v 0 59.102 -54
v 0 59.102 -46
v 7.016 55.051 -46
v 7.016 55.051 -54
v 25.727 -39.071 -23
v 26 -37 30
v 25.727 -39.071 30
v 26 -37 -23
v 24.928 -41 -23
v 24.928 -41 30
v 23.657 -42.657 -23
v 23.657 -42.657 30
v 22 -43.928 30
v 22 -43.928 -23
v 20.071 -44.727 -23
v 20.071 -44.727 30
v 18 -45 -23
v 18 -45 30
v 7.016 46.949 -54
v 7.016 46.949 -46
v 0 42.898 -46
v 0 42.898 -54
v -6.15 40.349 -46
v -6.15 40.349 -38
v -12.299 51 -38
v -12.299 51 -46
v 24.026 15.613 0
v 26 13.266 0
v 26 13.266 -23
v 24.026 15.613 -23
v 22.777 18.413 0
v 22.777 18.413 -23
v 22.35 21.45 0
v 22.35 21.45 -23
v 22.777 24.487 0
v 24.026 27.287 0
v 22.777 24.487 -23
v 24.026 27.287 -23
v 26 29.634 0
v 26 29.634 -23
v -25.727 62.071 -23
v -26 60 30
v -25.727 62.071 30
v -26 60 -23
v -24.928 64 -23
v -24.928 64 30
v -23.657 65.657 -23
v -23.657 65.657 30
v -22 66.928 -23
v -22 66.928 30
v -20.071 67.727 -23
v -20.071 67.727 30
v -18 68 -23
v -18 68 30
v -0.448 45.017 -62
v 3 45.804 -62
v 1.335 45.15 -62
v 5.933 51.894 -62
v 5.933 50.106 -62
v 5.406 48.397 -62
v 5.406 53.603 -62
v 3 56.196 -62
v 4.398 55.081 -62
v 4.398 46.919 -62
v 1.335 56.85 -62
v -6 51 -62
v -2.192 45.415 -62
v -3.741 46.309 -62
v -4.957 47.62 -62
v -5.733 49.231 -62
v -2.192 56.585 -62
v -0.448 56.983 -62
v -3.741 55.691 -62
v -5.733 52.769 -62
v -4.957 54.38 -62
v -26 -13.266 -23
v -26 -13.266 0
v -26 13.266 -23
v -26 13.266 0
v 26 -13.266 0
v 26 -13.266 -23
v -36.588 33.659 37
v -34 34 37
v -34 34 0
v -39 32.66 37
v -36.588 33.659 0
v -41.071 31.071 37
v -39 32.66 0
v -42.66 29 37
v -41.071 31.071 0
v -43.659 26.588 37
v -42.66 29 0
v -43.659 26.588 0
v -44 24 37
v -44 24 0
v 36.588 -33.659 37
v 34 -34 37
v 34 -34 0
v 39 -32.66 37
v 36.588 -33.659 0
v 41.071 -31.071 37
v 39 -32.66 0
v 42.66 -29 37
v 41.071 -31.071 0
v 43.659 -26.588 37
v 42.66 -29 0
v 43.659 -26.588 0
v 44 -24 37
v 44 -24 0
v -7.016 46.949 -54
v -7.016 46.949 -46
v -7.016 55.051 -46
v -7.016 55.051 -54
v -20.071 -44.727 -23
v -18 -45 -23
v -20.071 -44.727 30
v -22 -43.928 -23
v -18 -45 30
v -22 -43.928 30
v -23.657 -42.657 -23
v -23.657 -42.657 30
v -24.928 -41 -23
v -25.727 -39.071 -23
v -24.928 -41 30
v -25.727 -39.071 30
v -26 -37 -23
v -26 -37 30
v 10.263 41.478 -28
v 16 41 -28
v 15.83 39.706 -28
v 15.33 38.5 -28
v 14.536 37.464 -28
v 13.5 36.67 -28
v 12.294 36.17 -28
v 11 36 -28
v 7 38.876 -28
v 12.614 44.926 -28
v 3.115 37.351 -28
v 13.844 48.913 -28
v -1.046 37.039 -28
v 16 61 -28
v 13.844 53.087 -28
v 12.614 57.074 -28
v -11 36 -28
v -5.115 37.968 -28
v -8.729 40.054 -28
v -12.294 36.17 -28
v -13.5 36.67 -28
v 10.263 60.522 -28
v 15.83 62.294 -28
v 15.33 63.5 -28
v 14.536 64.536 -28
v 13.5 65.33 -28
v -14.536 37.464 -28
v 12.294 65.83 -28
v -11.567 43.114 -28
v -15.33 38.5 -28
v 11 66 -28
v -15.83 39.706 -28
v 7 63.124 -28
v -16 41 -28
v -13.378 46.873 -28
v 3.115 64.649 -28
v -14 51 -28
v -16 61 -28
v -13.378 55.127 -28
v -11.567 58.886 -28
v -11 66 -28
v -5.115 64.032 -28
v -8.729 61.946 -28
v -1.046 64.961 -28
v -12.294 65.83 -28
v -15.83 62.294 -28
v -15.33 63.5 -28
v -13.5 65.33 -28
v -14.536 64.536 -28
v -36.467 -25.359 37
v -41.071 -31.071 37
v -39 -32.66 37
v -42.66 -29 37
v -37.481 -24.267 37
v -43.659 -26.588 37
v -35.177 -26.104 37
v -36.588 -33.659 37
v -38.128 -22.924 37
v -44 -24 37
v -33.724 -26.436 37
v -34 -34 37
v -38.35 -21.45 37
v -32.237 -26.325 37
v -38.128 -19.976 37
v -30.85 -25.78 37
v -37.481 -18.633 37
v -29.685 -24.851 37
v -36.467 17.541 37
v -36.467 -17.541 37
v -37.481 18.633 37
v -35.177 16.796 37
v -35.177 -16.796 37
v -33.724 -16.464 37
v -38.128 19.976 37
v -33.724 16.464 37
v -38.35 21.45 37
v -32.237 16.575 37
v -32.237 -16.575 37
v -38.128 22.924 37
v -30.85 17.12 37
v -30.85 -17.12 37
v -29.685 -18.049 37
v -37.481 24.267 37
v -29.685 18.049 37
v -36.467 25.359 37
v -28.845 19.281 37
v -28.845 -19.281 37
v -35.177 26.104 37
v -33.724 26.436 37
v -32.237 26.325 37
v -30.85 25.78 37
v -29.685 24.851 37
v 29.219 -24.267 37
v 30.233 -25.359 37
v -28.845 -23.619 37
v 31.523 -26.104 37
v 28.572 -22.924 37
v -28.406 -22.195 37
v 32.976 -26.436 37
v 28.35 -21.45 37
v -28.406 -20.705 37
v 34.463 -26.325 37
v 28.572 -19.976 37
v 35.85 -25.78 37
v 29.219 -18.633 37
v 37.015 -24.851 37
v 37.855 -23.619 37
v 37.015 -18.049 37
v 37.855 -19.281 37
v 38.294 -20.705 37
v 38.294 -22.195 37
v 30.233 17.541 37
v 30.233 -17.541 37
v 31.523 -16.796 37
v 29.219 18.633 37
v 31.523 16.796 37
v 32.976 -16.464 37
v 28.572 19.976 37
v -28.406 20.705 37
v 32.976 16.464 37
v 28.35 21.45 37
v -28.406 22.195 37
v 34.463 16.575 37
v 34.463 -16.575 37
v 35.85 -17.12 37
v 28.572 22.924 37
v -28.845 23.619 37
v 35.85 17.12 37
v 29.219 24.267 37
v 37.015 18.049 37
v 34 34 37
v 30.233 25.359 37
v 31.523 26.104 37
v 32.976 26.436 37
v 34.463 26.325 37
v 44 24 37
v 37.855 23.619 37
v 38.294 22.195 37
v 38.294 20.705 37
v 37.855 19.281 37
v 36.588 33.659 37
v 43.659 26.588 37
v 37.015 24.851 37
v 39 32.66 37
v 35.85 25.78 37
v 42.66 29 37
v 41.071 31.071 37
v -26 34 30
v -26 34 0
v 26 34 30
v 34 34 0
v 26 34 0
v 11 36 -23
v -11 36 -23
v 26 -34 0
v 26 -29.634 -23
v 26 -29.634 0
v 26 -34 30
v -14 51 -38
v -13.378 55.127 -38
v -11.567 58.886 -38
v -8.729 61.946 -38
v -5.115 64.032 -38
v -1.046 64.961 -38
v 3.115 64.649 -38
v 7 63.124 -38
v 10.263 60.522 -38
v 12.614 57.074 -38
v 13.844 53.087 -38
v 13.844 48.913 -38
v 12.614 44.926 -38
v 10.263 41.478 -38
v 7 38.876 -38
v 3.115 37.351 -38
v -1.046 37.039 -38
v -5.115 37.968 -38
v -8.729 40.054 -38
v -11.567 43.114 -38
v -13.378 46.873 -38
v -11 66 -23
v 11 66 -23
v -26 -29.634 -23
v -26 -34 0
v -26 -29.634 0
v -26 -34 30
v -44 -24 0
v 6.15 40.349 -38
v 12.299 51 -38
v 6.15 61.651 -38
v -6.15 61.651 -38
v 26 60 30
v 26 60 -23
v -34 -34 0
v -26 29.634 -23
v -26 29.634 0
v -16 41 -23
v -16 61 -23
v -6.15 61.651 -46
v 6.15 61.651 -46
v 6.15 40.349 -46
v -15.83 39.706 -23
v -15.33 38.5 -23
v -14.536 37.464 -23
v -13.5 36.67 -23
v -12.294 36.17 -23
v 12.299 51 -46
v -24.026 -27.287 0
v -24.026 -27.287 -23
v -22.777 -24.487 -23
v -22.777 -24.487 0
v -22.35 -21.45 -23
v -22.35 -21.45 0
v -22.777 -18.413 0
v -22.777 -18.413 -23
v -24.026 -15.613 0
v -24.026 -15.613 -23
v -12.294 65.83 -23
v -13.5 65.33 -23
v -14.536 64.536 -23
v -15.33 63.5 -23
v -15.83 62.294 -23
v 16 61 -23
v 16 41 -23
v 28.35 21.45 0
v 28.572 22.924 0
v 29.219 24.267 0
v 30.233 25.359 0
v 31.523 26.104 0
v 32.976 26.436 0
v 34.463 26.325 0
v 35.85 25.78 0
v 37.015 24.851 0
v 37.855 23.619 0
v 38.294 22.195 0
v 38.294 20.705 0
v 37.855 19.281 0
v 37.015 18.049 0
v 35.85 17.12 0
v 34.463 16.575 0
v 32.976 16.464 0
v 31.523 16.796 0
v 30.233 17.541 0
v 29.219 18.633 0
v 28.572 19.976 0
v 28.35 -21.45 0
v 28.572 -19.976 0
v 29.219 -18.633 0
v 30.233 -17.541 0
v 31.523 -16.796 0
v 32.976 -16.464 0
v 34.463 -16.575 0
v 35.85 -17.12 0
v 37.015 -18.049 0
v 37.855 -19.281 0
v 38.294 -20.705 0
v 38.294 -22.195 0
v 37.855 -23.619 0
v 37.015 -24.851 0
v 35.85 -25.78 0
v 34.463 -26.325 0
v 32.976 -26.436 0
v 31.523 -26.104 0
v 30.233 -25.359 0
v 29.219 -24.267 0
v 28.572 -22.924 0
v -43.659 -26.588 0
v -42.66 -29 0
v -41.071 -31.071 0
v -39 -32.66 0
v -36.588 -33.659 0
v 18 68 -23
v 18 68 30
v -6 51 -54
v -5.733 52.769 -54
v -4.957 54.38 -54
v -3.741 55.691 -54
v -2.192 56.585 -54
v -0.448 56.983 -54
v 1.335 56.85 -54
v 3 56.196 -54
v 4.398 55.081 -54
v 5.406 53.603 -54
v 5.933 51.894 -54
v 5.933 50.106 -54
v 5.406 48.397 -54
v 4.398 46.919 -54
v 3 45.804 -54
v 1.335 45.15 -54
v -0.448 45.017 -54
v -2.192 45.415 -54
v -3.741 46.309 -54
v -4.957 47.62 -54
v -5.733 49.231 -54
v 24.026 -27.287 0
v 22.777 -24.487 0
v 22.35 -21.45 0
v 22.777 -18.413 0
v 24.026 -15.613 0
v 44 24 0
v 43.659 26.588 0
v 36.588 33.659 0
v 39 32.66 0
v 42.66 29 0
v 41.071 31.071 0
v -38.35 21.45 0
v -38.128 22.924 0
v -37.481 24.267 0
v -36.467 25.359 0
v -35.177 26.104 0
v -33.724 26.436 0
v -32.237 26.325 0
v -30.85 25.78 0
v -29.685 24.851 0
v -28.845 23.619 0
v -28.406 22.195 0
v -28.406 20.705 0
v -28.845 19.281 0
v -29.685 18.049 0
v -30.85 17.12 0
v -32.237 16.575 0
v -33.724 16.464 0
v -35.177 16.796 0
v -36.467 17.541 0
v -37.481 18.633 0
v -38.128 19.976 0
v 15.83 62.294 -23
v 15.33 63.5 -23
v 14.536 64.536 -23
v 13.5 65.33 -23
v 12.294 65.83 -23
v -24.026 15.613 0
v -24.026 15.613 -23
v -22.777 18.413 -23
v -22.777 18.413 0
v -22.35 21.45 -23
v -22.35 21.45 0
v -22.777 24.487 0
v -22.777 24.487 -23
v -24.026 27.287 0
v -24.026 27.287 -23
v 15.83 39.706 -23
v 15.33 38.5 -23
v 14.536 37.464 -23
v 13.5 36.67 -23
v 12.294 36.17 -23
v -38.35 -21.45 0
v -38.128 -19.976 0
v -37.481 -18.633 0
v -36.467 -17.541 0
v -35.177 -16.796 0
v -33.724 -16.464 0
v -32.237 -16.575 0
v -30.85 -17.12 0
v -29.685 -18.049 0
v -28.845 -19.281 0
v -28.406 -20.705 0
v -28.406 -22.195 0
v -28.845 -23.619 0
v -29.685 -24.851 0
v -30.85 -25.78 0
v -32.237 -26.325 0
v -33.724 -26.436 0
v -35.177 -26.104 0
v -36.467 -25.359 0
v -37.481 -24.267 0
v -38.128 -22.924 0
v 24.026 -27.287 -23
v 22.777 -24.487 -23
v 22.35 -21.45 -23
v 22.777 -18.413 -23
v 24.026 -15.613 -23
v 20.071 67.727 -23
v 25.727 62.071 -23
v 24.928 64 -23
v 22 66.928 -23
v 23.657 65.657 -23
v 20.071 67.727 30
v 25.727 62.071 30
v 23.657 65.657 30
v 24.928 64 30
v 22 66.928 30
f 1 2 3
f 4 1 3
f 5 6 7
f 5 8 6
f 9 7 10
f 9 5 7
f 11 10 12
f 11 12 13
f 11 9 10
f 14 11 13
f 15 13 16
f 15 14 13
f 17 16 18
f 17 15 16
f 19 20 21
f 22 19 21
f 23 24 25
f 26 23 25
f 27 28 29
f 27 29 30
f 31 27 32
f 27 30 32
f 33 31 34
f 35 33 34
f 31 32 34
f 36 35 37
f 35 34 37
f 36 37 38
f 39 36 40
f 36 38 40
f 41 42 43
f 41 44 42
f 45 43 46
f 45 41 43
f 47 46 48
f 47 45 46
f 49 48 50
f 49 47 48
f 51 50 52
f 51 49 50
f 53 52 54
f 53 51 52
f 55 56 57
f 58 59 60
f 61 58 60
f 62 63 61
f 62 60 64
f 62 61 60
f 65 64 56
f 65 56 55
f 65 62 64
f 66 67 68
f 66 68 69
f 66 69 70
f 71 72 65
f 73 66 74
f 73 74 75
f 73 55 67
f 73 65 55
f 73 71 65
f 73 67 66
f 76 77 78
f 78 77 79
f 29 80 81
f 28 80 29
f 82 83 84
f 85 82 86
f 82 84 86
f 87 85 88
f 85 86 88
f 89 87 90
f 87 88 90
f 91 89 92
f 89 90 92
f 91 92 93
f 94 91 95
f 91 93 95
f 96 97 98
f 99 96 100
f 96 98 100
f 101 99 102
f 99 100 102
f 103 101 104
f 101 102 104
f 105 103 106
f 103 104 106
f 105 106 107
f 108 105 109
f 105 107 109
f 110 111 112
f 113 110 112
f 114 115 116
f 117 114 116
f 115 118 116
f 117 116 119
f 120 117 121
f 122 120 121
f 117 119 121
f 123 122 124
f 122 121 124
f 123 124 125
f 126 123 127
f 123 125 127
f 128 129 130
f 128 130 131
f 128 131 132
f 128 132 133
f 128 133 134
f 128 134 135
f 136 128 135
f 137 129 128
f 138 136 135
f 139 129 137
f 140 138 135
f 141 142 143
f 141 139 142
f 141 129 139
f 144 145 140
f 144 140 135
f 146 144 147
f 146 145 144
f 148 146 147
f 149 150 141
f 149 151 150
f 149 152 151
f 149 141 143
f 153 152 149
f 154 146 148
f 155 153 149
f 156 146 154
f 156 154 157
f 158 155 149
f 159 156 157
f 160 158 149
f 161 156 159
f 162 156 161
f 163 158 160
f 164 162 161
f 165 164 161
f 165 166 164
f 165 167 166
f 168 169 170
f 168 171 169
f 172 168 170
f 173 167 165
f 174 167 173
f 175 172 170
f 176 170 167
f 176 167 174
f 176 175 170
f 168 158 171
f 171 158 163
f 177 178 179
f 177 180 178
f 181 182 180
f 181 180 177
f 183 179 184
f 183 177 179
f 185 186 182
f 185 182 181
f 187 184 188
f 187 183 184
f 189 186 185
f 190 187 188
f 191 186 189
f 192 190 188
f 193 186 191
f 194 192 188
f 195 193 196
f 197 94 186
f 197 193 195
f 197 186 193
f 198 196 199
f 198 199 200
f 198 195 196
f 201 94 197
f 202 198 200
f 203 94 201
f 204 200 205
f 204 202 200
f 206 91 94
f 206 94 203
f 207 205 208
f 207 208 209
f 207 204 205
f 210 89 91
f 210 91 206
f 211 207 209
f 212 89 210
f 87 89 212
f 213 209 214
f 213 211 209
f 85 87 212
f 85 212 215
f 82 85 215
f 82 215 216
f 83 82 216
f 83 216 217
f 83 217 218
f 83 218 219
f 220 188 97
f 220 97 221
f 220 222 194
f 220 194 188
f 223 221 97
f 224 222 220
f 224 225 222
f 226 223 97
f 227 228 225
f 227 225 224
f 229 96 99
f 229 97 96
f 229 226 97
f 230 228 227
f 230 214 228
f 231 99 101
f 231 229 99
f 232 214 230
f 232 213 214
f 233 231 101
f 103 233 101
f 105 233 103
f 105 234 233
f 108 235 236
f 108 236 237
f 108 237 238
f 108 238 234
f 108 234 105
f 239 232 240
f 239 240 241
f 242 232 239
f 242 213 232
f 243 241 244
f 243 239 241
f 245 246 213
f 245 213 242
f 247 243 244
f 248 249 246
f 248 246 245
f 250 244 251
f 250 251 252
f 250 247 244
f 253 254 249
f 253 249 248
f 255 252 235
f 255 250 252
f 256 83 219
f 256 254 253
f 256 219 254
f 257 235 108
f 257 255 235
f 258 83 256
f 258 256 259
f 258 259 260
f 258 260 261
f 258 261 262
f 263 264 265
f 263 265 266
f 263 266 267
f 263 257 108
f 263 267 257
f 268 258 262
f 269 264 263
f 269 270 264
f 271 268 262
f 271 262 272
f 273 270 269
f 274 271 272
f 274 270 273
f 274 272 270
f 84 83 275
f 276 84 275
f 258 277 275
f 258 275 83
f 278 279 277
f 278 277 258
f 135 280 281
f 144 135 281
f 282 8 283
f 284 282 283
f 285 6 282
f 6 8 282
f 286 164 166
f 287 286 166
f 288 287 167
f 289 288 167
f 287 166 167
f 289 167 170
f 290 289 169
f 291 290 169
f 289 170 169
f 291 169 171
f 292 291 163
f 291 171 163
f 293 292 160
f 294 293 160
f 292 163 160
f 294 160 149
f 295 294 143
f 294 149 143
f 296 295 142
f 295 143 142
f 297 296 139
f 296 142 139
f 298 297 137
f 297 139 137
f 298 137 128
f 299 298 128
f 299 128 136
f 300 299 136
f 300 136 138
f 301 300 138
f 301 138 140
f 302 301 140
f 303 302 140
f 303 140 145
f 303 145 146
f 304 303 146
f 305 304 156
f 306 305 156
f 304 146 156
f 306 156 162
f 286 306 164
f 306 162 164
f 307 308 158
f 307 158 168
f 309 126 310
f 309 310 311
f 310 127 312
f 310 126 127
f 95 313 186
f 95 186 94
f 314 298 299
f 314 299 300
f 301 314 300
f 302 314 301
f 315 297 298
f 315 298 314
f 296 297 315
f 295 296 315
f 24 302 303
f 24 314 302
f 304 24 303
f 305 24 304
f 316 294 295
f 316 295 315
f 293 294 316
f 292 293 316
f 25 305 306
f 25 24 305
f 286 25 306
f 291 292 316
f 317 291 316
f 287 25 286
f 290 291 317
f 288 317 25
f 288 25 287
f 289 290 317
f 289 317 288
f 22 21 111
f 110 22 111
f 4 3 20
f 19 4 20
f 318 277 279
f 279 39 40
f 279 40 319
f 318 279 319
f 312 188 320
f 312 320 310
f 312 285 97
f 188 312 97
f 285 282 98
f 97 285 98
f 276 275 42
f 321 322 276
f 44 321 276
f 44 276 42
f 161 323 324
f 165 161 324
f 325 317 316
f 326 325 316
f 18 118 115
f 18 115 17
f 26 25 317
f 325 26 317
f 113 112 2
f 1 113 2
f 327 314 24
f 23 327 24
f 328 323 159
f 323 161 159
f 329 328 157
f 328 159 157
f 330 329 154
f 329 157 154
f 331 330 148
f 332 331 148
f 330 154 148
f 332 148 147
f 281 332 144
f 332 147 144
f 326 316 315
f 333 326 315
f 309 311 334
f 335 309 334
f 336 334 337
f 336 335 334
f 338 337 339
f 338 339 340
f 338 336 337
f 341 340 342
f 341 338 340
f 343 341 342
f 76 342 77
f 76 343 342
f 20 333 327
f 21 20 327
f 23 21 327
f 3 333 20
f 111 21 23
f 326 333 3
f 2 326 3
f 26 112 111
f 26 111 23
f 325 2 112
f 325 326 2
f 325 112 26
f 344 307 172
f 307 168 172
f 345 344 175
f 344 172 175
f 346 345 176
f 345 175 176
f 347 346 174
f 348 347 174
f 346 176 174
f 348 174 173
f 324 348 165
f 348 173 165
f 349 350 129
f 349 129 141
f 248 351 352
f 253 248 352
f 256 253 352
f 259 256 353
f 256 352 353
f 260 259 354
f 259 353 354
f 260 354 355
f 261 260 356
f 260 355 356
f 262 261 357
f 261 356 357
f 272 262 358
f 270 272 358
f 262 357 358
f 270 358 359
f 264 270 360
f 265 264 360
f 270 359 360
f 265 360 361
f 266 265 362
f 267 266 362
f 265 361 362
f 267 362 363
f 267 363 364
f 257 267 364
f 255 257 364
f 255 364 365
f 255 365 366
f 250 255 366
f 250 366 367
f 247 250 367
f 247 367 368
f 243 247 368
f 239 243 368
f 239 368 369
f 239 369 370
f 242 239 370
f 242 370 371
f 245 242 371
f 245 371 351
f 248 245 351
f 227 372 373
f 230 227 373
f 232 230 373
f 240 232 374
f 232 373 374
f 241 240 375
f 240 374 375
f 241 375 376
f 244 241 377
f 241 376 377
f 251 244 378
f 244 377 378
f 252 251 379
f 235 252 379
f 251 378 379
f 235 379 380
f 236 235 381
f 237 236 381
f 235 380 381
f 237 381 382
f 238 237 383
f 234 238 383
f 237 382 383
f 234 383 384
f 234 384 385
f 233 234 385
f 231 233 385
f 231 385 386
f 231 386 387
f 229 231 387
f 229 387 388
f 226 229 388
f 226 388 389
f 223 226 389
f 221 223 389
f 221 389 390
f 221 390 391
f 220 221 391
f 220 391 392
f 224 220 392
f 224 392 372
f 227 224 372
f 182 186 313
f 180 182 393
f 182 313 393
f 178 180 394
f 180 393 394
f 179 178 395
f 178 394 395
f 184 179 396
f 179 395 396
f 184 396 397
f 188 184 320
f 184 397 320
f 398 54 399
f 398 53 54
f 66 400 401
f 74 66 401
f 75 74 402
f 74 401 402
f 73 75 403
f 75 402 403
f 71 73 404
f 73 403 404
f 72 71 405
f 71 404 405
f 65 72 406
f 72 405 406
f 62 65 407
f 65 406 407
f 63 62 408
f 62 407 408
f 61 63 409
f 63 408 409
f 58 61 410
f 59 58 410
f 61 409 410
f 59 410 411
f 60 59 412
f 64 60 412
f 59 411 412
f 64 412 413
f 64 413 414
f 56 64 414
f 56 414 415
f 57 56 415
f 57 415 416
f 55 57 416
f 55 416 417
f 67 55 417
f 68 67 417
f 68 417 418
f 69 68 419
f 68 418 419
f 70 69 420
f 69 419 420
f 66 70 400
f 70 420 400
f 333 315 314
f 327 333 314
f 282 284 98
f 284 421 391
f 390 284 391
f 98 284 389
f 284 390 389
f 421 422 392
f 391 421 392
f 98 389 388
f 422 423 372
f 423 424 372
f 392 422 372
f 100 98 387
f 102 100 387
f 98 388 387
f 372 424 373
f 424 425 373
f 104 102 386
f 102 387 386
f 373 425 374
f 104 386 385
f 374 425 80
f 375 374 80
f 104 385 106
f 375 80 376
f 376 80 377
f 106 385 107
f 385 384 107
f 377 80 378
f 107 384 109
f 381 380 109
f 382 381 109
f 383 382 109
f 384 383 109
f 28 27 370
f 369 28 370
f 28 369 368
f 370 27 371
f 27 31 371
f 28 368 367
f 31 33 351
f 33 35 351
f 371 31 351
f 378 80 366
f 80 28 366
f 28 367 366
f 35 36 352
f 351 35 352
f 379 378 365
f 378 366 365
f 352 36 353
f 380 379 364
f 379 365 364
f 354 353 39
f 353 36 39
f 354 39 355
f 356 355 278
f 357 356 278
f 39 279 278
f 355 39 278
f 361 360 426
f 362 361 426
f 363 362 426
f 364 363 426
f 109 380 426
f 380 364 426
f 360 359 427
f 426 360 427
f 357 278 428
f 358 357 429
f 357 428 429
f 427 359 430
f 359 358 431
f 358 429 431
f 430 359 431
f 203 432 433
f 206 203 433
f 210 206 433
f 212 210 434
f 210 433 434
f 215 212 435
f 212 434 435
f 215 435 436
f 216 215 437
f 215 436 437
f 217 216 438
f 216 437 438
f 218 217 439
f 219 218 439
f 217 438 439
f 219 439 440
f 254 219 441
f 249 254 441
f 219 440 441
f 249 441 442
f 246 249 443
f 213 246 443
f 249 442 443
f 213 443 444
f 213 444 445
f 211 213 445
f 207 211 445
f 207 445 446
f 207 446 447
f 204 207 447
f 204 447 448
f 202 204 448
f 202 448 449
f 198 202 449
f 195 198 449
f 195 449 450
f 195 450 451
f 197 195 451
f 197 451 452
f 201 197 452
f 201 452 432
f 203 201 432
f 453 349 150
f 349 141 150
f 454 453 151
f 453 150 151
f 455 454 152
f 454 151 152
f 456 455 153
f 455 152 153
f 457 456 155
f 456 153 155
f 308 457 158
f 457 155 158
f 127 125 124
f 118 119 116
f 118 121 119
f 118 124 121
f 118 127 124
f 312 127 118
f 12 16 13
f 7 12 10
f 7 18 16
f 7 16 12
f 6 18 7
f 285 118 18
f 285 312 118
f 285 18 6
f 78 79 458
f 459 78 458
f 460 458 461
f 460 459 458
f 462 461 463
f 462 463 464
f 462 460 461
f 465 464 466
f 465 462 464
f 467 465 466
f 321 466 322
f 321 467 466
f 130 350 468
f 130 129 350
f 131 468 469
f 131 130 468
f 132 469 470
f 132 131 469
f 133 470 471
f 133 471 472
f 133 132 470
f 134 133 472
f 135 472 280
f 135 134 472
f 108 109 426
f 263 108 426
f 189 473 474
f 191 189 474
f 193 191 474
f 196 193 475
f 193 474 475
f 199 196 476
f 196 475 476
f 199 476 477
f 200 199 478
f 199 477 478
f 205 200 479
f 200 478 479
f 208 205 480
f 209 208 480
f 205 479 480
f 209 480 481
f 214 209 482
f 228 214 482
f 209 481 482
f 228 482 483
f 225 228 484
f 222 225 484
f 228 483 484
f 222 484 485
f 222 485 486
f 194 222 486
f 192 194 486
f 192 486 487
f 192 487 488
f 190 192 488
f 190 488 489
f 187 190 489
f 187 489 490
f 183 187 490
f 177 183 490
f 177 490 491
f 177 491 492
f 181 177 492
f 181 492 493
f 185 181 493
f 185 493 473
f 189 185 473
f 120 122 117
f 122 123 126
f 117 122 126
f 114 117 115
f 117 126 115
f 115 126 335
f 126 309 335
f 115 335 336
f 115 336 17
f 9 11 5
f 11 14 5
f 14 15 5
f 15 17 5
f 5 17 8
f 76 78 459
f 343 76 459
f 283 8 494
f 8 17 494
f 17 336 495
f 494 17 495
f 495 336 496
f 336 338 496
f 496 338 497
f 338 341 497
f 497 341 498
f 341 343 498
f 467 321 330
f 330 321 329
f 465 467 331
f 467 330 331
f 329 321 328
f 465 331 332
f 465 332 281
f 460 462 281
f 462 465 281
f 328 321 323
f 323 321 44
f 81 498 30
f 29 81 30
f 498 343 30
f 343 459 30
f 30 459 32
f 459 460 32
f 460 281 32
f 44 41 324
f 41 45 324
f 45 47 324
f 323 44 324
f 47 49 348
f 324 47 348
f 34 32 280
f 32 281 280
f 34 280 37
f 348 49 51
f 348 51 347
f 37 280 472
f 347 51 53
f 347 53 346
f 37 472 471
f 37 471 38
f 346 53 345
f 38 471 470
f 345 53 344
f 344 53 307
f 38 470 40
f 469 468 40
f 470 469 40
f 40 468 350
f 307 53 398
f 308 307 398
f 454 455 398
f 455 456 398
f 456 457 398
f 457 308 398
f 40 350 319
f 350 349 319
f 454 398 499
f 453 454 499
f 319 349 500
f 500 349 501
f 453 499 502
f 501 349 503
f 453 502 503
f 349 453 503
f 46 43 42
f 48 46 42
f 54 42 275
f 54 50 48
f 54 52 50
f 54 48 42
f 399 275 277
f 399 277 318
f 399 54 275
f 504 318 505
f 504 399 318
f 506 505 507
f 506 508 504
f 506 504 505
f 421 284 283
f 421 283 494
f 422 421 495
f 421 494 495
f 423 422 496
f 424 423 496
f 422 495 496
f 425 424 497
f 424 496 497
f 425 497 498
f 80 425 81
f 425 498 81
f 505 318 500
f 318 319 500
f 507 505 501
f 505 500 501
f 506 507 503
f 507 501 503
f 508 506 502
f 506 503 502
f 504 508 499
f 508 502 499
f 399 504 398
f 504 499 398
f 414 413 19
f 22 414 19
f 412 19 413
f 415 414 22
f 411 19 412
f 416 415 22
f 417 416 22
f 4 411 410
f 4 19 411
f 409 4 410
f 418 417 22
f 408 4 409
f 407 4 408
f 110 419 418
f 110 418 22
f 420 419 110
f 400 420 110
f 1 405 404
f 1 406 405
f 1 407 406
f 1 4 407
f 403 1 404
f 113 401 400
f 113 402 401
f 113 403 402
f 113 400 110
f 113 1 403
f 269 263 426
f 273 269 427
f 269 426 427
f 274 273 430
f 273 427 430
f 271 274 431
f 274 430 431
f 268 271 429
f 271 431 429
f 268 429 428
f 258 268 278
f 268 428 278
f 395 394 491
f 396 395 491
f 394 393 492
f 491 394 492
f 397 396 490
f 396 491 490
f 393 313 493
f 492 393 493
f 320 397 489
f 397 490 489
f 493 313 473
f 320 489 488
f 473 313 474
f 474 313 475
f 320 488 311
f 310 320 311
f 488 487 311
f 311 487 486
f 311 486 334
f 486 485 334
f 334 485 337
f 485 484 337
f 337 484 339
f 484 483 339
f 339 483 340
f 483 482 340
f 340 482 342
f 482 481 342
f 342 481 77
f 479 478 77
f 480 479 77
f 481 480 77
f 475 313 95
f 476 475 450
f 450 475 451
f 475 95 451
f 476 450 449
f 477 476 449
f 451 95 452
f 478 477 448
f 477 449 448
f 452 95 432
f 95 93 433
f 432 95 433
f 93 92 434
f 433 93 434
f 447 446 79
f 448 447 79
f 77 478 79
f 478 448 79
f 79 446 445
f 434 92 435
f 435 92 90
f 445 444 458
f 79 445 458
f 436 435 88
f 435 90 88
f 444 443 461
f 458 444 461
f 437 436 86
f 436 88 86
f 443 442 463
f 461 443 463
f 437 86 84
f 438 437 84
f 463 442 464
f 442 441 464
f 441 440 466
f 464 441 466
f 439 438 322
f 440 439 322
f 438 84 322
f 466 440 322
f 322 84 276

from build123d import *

# Parameters (mm, degrees)
SKETCH_1_W          = 88
SKETCH_1_H          = 68
EXTRUDE_1_DEPTH     = 37
SKETCH_2_W          = 52
SKETCH_2_H          = 113
EXTRUDE_2_DEPTH     = 60
SKETCH_3_R          = 5
CUT_EXTRUDE_1_DEPTH = 60
CUT_EXTRUDE_2_DEPTH = 23
SKETCH_5_OUTSIDE_W  = 121.056
SKETCH_5_OUTSIDE_H  = 146.056
CUT_EXTRUDE_3_DEPTH = 38
SKETCH_7_W          = 52
SKETCH_7_H          = 34
SKETCH_7_H_2        = 11
EXTRUDE_3_DEPTH     = 30
FILLET_1_R          = 8
SKETCH_8_W          = 32
SKETCH_8_H          = 30
EXTRUDE_4_DEPTH     = 5
SKETCH_9_R          = 14
EXTRUDE_5_DEPTH     = 10
EXTRUDE_6_DEPTH     = 8
FILLET_2_R          = 5
EXTRUDE_7_DEPTH     = 8
SKETCH_12_R         = 6
EXTRUDE_8_DEPTH     = 8


with BuildPart() as part:
    # 草图1 → 凸台-拉伸1 (new body)
    with BuildSketch(Plane.XY):
        Rectangle(SKETCH_1_W, SKETCH_1_H)
    extrude(amount=EXTRUDE_1_DEPTH)

    # 草图2 → 凸台-拉伸2 (add)
    with BuildSketch(Plane.XY.offset(37)):
        with Locations((0, 11.5)):
            Rectangle(SKETCH_2_W, SKETCH_2_H)
    extrude(amount=-EXTRUDE_2_DEPTH)

    # 草图3 → 切除-拉伸1 (cut)
    with BuildSketch(Plane(origin=(0, 0, -23), x_dir=(-1, 0, 0), z_dir=(0, 0, -1))):
        with Locations((-33.35, 21.45)):
            Circle(SKETCH_3_R)
        with Locations((33.35, 21.45)):
            Circle(SKETCH_3_R)
        with Locations((33.35, -21.45)):
            Circle(SKETCH_3_R)
        with Locations((-33.35, -21.45)):
            Circle(SKETCH_3_R)
    extrude(amount=-CUT_EXTRUDE_1_DEPTH, mode=Mode.SUBTRACT)

    # 草图4 → 切除-拉伸2 (cut)
    with BuildSketch(Plane(origin=(0, 0, -23), x_dir=(-1, 0, 0), z_dir=(0, 0, -1))):
        with BuildLine():
            Line((-26, 29.63397825), (-26, 13.26602175))
            ThreePointArc((-26, 13.26602175), (-22.35, 21.45), (-26, 29.63397825))
        make_face()
        with BuildLine():
            Line((26, 29.63397825), (26, 13.26602175))
            ThreePointArc((26, 13.26602175), (22.35, 21.45), (26, 29.63397825))
        make_face()
        with BuildLine():
            Line((26, -13.26602175), (26, -29.63397825))
            ThreePointArc((26, -29.63397825), (22.35, -21.45), (26, -13.26602175))
        make_face()
        with BuildLine():
            Line((-26, -13.26602175), (-26, -29.63397825))
            ThreePointArc((-26, -29.63397825), (-22.35, -21.45), (-26, -13.26602175))
        make_face()
    extrude(amount=-CUT_EXTRUDE_2_DEPTH, mode=Mode.SUBTRACT)

    # 草图5 outside → 切除-拉伸3 (cut, through all)
    with BuildSketch(Plane(origin=(0, 0, 0), x_dir=(-1, 0, 0), z_dir=(0, 0, -1))):
        with Locations((0, 11.5)):
            Rectangle(SKETCH_5_OUTSIDE_W, SKETCH_5_OUTSIDE_H)
        with BuildLine():
            Line((-34, 34), (34, 34))
            ThreePointArc((34, 34), (41.071067812, 31.071067812), (44, 24))
            Line((44, 24), (44, -24))
            ThreePointArc((44, -24), (41.071067812, -31.071067812), (34, -34))
            Line((34, -34), (-34, -34))
            ThreePointArc((-34, -34), (-41.071067812, -31.071067812), (-44, -24))
            Line((-44, -24), (-44, 24))
            ThreePointArc((-44, 24), (-41.071067812, 31.071067812), (-34, 34))
        make_face(mode=Mode.SUBTRACT)
    extrude(amount=-CUT_EXTRUDE_3_DEPTH, mode=Mode.SUBTRACT)

    # 草图7 → 凸台-拉伸3 (add)
    with BuildSketch(Plane.XY):
        with Locations((0, 51)):
            Rectangle(SKETCH_7_W, SKETCH_7_H)
        with Locations((0, -39.5)):
            Rectangle(SKETCH_7_W, SKETCH_7_H_2)
    extrude(amount=EXTRUDE_3_DEPTH)

    # 圆角1
    fillet_1_edges = [part.edges().sort_by_distance(p)[0] for p in [
        (-26, -45, 3.5),
        (26, 68, 3.5),
        (-26, 68, 3.5),
        (26, -45, 3.5),
    ]]
    fillet(fillet_1_edges, radius=FILLET_1_R)

    # 草图8 → 凸台-拉伸4 (add)
    with BuildSketch(Plane(origin=(0, 0, -23), x_dir=(-1, 0, 0), z_dir=(0, 0, -1))):
        with Locations((0, 51)):
            Rectangle(SKETCH_8_W, SKETCH_8_H)
    extrude(amount=EXTRUDE_4_DEPTH)

    # 草图9 → 凸台-拉伸5 (add)
    with BuildSketch(Plane(origin=(0, 0, -28), x_dir=(-1, 0, 0), z_dir=(0, 0, -1))):
        with Locations((0, 51)):
            Circle(SKETCH_9_R)
    extrude(amount=EXTRUDE_5_DEPTH)

    # 草图10 → 凸台-拉伸6 (add)
    with BuildSketch(Plane(origin=(0, 0, -38), x_dir=(-1, 0, 0), z_dir=(0, 0, -1))):
        Polygon((-6.149615956, 61.651447283), (-12.299231913, 51), (-6.149615956, 40.348552717), (6.149615956, 40.348552717), (12.299231913, 51), (6.149615956, 61.651447283), align=None)
    extrude(amount=EXTRUDE_6_DEPTH)

    # 圆角2
    fillet_2_edges = [part.edges().sort_by_distance(p)[0] for p in [
        (16, 66, -25.5),
        (16, 36, -25.5),
        (-16, 36, -25.5),
        (-16, 66, -25.5),
    ]]
    fillet(fillet_2_edges, radius=FILLET_2_R)

    # 草图11 → 凸台-拉伸7 (add)
    with BuildSketch(Plane(origin=(0, 0, -46), x_dir=(-1, 0, 0), z_dir=(0, 0, -1))):
        Polygon((0, 42.898459123), (7.016140209, 46.949229562), (7.016140209, 55.050770438), (0, 59.101540877), (-7.016140209, 55.050770438), (-7.016140209, 46.949229562), align=None)
    extrude(amount=EXTRUDE_7_DEPTH)

    # 草图12 → 凸台-拉伸8 (add)
    with BuildSketch(Plane(origin=(0, 0, -54), x_dir=(-1, 0, 0), z_dir=(0, 0, -1))):
        with Locations((0, 51)):
            Circle(SKETCH_12_R)
    extrude(amount=EXTRUDE_8_DEPTH)


solid = part.part
